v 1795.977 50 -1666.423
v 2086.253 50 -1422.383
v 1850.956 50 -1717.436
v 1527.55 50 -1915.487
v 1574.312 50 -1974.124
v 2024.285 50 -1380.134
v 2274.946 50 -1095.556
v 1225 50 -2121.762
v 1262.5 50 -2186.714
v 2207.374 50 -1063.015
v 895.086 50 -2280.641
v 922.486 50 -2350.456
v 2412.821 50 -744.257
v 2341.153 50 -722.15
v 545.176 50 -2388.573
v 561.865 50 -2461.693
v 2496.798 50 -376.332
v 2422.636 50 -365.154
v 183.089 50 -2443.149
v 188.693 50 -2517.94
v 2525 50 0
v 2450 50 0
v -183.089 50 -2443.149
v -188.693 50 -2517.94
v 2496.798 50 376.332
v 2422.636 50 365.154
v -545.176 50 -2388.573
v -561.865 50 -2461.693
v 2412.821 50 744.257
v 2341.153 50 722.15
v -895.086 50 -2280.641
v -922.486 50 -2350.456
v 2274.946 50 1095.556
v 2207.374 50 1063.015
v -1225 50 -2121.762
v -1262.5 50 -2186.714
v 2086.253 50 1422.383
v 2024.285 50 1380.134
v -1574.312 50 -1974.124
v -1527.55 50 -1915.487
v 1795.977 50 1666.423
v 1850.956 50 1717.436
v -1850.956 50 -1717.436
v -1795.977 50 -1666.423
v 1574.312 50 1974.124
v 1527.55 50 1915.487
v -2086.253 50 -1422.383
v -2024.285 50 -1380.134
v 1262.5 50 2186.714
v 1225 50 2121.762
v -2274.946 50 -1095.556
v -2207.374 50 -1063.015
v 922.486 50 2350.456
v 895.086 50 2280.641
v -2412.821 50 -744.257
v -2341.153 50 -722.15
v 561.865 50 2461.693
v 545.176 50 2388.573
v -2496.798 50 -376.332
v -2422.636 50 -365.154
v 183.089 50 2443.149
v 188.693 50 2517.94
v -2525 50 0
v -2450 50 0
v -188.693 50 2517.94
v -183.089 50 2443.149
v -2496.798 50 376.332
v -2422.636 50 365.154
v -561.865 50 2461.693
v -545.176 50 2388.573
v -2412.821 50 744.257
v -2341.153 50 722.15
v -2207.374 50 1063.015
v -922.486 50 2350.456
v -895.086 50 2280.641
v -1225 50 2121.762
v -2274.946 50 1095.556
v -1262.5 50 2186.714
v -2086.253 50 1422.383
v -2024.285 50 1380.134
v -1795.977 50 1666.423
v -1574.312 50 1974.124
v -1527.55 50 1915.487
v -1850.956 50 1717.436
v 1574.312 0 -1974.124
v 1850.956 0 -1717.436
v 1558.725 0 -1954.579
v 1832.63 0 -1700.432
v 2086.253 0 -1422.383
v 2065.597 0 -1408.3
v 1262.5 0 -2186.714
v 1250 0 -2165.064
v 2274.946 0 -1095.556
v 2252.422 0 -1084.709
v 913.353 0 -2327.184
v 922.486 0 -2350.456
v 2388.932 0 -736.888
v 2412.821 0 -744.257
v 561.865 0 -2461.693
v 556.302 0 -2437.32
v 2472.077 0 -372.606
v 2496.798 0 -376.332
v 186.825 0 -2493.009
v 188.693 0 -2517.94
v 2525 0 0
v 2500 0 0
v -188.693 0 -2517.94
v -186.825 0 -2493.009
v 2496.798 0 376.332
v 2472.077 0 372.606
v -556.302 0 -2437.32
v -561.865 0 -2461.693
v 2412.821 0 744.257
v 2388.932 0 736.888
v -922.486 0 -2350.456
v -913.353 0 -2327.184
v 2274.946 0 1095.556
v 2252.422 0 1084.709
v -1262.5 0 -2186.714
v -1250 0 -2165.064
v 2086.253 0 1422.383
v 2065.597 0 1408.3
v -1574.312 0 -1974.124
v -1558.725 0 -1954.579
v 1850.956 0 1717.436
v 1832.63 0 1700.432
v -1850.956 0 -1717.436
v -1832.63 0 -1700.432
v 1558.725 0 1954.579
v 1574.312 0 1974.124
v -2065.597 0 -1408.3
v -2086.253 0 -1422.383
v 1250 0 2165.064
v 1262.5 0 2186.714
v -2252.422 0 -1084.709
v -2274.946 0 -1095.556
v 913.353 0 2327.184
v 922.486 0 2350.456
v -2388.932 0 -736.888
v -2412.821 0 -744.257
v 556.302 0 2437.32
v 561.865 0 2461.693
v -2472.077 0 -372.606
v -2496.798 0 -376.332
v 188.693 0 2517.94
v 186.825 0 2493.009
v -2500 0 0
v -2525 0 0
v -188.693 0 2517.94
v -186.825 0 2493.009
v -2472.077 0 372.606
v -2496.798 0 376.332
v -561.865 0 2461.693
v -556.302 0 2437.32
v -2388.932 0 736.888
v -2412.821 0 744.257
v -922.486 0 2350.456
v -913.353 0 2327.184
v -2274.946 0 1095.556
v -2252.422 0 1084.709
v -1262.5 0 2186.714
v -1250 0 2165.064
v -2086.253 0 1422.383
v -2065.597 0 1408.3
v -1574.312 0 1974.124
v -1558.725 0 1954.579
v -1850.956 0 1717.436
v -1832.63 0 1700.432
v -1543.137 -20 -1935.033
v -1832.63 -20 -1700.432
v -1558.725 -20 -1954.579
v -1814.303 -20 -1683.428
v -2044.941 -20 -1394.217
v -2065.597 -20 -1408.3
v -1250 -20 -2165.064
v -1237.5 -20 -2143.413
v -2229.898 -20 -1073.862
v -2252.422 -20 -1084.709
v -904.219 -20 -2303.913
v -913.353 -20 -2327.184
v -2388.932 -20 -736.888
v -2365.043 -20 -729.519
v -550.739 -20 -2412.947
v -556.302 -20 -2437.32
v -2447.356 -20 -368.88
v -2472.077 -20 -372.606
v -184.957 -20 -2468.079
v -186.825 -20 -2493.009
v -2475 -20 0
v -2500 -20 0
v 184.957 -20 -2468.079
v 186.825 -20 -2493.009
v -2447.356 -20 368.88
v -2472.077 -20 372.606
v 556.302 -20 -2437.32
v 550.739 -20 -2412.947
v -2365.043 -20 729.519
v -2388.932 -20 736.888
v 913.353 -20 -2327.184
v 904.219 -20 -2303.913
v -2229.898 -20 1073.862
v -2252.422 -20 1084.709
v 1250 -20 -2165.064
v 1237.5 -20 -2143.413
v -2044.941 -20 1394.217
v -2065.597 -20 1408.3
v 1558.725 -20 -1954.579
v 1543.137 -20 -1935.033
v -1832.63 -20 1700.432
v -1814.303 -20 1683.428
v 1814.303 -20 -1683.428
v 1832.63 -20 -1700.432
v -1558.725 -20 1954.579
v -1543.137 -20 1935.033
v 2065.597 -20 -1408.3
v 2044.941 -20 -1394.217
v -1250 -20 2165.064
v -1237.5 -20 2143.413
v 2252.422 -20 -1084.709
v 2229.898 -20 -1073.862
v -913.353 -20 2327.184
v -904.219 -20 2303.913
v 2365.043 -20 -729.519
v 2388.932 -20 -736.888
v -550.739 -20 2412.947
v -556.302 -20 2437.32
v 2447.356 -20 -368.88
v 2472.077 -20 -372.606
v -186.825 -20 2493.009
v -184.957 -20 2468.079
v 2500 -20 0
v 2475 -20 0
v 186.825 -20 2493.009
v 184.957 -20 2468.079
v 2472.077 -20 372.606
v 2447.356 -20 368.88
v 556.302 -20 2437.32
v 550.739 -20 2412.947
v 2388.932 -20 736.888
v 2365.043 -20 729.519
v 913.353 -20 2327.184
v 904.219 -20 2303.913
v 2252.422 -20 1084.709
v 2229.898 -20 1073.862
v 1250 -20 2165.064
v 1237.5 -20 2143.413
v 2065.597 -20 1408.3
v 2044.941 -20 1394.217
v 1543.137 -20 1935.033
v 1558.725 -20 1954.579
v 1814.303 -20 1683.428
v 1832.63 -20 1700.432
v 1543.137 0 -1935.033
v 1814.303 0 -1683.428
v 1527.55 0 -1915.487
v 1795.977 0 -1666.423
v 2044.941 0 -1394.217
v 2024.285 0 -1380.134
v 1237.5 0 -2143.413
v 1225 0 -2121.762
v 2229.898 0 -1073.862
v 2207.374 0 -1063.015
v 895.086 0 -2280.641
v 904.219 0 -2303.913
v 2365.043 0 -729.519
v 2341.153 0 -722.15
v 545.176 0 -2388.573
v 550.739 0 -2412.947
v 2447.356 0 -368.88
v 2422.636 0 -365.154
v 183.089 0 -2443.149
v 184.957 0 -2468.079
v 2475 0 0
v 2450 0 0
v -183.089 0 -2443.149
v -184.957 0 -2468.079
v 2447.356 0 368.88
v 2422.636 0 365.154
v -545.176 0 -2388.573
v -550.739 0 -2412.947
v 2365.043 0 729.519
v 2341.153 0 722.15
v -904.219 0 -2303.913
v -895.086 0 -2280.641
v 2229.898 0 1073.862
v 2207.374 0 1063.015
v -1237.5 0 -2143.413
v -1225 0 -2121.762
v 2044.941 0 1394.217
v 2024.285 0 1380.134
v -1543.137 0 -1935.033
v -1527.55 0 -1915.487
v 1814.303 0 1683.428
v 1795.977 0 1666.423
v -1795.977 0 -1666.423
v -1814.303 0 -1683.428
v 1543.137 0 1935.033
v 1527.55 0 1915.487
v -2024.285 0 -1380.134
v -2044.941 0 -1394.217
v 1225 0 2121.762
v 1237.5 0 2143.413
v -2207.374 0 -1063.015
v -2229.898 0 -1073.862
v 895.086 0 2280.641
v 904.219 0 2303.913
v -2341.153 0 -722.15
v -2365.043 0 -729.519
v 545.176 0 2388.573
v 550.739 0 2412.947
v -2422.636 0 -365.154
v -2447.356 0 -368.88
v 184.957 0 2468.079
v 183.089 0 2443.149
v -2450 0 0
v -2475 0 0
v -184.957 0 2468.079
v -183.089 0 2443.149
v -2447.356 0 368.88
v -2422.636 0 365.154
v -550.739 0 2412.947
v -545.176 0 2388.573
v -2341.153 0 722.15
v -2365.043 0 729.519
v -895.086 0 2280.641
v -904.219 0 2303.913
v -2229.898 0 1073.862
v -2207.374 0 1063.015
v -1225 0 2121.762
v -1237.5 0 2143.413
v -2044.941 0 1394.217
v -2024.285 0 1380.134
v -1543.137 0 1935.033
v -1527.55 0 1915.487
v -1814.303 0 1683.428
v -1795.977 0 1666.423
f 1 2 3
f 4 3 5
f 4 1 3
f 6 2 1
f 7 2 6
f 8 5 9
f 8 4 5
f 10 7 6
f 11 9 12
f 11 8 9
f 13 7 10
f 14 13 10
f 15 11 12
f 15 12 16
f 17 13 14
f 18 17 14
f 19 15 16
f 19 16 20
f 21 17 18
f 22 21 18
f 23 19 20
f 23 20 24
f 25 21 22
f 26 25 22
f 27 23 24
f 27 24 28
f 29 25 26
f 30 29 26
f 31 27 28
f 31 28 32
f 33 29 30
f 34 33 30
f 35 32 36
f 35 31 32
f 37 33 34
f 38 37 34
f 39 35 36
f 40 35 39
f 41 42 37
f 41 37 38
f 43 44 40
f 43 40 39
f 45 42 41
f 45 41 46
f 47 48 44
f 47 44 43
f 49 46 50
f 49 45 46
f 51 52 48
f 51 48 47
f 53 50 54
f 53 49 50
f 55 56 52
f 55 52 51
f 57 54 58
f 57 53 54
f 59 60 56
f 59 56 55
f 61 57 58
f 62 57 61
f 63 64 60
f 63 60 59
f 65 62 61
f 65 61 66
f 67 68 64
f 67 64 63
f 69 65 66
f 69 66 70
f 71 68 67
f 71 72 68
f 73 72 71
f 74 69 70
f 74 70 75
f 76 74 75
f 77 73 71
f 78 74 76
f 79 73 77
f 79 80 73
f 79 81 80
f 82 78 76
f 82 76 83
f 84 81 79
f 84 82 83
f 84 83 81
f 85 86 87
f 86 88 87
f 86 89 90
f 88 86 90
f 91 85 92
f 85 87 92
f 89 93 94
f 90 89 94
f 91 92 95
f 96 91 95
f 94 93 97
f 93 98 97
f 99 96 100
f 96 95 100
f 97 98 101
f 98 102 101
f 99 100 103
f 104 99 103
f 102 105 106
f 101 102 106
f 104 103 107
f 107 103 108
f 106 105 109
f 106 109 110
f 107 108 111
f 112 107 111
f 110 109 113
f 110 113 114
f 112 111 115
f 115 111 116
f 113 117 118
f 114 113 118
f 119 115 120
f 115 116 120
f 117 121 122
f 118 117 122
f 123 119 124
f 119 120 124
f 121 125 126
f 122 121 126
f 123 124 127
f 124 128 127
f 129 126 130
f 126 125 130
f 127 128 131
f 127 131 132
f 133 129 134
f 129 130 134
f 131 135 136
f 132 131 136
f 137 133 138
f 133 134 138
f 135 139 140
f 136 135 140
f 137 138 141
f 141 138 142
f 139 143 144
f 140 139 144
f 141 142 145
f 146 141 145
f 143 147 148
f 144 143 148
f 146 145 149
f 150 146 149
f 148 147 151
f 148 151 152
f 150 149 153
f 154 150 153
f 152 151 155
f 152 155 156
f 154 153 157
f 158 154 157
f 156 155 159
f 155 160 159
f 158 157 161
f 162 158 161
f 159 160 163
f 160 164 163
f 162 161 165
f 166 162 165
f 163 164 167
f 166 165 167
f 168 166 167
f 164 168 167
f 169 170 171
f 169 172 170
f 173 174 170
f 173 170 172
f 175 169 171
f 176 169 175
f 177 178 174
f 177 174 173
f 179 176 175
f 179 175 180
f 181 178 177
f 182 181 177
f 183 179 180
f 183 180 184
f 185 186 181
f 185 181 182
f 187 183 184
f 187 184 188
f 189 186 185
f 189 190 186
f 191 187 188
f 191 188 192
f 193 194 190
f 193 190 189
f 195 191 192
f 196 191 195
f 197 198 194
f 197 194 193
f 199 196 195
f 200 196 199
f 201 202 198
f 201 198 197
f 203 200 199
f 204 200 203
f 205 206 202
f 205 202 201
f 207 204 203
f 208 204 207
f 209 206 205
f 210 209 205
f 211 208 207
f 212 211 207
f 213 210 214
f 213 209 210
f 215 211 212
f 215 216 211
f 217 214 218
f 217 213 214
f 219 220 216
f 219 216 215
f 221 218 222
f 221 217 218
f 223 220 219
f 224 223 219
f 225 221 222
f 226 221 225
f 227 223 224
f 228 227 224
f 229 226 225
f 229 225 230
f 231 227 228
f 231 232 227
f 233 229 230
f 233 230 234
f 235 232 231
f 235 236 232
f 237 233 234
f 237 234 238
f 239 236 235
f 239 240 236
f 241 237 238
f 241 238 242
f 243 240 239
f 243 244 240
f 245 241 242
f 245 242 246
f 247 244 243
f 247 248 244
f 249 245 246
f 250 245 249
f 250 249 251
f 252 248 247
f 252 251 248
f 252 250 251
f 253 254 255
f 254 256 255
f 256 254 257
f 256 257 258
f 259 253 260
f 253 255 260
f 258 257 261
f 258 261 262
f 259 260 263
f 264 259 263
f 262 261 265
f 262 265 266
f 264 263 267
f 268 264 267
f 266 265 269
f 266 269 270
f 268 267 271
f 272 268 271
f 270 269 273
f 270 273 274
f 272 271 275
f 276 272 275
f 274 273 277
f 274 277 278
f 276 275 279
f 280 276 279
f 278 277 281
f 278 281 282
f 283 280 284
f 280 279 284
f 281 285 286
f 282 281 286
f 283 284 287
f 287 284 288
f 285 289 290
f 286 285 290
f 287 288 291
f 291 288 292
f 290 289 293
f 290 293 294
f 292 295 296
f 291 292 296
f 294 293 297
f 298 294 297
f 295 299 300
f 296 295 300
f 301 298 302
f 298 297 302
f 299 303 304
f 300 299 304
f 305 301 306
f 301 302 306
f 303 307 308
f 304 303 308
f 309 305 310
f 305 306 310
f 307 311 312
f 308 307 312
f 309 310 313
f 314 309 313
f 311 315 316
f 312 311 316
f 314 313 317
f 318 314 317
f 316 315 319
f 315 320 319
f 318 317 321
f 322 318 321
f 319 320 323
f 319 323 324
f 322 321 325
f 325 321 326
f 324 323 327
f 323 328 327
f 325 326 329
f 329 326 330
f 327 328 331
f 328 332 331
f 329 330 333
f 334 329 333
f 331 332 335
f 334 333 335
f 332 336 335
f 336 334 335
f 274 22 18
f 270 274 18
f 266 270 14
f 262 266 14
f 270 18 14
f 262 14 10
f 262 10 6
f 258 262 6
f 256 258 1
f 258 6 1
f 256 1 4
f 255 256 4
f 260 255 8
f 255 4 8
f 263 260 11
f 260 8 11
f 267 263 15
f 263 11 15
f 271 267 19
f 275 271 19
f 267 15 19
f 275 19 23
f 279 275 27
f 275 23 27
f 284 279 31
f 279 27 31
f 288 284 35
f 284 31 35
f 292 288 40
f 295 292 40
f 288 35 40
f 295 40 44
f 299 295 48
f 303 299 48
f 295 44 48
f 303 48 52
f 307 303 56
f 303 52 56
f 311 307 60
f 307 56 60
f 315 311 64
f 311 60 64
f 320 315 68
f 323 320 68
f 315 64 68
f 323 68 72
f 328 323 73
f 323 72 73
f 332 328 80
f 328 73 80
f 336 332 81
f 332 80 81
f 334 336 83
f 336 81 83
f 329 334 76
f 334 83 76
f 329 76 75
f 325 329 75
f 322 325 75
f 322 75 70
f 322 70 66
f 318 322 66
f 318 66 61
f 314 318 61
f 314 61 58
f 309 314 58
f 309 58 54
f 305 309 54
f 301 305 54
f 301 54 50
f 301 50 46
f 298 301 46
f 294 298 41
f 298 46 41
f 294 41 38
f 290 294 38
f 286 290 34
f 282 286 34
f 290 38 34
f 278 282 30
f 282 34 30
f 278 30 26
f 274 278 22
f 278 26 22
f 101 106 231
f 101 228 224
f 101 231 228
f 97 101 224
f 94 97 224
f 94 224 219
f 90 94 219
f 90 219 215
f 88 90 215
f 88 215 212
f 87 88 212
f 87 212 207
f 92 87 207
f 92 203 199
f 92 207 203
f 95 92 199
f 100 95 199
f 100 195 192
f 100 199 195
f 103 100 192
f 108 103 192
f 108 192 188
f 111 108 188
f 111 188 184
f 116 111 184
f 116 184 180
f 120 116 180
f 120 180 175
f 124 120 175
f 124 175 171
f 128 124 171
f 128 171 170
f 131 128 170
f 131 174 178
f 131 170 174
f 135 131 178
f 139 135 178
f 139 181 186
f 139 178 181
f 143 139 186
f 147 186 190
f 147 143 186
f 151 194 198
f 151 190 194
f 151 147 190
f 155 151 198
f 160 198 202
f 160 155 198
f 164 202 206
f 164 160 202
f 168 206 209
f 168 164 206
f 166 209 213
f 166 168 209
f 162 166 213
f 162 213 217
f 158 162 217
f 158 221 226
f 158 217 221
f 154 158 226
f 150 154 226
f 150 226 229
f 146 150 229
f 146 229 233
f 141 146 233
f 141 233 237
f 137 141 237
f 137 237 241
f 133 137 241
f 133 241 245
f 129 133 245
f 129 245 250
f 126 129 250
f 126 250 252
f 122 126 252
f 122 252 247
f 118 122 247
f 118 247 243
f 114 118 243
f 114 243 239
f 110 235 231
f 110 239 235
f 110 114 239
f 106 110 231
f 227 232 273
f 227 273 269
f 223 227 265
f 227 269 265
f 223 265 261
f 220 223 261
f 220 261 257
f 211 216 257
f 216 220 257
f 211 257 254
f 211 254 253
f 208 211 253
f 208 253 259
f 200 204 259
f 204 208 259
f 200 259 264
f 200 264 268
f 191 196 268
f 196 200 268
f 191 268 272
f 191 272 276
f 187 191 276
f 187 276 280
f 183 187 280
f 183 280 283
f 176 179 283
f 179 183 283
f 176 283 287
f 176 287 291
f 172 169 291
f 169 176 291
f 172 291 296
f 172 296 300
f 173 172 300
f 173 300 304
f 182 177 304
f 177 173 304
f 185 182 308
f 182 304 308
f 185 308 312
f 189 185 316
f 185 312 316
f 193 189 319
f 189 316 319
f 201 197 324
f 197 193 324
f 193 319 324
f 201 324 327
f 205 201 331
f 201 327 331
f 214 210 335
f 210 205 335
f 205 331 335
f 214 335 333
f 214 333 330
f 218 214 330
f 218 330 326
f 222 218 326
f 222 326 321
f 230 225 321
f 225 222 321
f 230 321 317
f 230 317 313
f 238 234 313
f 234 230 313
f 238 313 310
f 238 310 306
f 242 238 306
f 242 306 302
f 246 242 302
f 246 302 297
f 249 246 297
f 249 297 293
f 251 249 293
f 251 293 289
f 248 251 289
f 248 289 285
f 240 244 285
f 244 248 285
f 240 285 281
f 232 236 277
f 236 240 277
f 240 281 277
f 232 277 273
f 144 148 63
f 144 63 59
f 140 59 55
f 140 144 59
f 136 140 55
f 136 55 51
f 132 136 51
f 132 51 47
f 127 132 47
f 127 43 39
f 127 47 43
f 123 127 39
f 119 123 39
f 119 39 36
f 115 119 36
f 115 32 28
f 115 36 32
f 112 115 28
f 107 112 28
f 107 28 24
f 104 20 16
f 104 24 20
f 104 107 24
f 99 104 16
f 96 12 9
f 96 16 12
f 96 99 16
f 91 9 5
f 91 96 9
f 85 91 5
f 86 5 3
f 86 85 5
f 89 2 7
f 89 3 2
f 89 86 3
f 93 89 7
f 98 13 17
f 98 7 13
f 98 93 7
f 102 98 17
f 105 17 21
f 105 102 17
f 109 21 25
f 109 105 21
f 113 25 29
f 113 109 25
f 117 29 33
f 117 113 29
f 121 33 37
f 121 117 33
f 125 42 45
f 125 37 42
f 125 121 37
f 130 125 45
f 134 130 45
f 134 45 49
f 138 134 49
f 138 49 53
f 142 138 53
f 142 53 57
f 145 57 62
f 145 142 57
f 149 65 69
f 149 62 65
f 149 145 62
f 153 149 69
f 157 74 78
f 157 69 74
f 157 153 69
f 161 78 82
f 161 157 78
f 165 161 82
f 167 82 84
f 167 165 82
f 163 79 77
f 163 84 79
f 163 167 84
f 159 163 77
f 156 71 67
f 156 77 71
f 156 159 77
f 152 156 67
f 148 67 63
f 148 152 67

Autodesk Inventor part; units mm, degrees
ref_plane "YZ Plane" through (0, 0, 0) normal (1, 0, 0) x (0, 1, 0)
ref_plane "XZ Plane" through (0, 0, 0) normal (0, 1, 0) x (-1, 0, 0)
ref_plane "XY Plane" through (0, 0, 0) normal (0, 0, 1) x (1, 0, 0)
sketch "Sketch1" plane through (0, 0, 0) normal (0, 1, 0) x (-1, 0, 0)
  circle A0 centre (0, 0) radius 2525
  dimension "d0" = 5050
extrude "Extrusion1" add sketch "Sketch1" along normal blind 50
sketch "Sketch2" plane through (0, 0, 0) normal (0, -1, 0) x (1, 0, 0)
  point P0 (0, 0)
sketch "Sketch3" plane through (0, 0, 0) normal (0, -1, 0) x (1, 0, 0)
  circle A0 centre (0, 0) radius 2500
  circle A1 centre (0, 0) radius 2475
extrude "Extrusion2" add sketch "Sketch3" along normal blind 20
sketch "Sketch4" plane through (0, 50, 0) normal (0, 1, 0) x (1, 0, 0)
  circle A0 centre (0, 0) radius 2450
extrude "Extrusion3" cut sketch "Sketch4" against normal through all
properties part number "Dome"
